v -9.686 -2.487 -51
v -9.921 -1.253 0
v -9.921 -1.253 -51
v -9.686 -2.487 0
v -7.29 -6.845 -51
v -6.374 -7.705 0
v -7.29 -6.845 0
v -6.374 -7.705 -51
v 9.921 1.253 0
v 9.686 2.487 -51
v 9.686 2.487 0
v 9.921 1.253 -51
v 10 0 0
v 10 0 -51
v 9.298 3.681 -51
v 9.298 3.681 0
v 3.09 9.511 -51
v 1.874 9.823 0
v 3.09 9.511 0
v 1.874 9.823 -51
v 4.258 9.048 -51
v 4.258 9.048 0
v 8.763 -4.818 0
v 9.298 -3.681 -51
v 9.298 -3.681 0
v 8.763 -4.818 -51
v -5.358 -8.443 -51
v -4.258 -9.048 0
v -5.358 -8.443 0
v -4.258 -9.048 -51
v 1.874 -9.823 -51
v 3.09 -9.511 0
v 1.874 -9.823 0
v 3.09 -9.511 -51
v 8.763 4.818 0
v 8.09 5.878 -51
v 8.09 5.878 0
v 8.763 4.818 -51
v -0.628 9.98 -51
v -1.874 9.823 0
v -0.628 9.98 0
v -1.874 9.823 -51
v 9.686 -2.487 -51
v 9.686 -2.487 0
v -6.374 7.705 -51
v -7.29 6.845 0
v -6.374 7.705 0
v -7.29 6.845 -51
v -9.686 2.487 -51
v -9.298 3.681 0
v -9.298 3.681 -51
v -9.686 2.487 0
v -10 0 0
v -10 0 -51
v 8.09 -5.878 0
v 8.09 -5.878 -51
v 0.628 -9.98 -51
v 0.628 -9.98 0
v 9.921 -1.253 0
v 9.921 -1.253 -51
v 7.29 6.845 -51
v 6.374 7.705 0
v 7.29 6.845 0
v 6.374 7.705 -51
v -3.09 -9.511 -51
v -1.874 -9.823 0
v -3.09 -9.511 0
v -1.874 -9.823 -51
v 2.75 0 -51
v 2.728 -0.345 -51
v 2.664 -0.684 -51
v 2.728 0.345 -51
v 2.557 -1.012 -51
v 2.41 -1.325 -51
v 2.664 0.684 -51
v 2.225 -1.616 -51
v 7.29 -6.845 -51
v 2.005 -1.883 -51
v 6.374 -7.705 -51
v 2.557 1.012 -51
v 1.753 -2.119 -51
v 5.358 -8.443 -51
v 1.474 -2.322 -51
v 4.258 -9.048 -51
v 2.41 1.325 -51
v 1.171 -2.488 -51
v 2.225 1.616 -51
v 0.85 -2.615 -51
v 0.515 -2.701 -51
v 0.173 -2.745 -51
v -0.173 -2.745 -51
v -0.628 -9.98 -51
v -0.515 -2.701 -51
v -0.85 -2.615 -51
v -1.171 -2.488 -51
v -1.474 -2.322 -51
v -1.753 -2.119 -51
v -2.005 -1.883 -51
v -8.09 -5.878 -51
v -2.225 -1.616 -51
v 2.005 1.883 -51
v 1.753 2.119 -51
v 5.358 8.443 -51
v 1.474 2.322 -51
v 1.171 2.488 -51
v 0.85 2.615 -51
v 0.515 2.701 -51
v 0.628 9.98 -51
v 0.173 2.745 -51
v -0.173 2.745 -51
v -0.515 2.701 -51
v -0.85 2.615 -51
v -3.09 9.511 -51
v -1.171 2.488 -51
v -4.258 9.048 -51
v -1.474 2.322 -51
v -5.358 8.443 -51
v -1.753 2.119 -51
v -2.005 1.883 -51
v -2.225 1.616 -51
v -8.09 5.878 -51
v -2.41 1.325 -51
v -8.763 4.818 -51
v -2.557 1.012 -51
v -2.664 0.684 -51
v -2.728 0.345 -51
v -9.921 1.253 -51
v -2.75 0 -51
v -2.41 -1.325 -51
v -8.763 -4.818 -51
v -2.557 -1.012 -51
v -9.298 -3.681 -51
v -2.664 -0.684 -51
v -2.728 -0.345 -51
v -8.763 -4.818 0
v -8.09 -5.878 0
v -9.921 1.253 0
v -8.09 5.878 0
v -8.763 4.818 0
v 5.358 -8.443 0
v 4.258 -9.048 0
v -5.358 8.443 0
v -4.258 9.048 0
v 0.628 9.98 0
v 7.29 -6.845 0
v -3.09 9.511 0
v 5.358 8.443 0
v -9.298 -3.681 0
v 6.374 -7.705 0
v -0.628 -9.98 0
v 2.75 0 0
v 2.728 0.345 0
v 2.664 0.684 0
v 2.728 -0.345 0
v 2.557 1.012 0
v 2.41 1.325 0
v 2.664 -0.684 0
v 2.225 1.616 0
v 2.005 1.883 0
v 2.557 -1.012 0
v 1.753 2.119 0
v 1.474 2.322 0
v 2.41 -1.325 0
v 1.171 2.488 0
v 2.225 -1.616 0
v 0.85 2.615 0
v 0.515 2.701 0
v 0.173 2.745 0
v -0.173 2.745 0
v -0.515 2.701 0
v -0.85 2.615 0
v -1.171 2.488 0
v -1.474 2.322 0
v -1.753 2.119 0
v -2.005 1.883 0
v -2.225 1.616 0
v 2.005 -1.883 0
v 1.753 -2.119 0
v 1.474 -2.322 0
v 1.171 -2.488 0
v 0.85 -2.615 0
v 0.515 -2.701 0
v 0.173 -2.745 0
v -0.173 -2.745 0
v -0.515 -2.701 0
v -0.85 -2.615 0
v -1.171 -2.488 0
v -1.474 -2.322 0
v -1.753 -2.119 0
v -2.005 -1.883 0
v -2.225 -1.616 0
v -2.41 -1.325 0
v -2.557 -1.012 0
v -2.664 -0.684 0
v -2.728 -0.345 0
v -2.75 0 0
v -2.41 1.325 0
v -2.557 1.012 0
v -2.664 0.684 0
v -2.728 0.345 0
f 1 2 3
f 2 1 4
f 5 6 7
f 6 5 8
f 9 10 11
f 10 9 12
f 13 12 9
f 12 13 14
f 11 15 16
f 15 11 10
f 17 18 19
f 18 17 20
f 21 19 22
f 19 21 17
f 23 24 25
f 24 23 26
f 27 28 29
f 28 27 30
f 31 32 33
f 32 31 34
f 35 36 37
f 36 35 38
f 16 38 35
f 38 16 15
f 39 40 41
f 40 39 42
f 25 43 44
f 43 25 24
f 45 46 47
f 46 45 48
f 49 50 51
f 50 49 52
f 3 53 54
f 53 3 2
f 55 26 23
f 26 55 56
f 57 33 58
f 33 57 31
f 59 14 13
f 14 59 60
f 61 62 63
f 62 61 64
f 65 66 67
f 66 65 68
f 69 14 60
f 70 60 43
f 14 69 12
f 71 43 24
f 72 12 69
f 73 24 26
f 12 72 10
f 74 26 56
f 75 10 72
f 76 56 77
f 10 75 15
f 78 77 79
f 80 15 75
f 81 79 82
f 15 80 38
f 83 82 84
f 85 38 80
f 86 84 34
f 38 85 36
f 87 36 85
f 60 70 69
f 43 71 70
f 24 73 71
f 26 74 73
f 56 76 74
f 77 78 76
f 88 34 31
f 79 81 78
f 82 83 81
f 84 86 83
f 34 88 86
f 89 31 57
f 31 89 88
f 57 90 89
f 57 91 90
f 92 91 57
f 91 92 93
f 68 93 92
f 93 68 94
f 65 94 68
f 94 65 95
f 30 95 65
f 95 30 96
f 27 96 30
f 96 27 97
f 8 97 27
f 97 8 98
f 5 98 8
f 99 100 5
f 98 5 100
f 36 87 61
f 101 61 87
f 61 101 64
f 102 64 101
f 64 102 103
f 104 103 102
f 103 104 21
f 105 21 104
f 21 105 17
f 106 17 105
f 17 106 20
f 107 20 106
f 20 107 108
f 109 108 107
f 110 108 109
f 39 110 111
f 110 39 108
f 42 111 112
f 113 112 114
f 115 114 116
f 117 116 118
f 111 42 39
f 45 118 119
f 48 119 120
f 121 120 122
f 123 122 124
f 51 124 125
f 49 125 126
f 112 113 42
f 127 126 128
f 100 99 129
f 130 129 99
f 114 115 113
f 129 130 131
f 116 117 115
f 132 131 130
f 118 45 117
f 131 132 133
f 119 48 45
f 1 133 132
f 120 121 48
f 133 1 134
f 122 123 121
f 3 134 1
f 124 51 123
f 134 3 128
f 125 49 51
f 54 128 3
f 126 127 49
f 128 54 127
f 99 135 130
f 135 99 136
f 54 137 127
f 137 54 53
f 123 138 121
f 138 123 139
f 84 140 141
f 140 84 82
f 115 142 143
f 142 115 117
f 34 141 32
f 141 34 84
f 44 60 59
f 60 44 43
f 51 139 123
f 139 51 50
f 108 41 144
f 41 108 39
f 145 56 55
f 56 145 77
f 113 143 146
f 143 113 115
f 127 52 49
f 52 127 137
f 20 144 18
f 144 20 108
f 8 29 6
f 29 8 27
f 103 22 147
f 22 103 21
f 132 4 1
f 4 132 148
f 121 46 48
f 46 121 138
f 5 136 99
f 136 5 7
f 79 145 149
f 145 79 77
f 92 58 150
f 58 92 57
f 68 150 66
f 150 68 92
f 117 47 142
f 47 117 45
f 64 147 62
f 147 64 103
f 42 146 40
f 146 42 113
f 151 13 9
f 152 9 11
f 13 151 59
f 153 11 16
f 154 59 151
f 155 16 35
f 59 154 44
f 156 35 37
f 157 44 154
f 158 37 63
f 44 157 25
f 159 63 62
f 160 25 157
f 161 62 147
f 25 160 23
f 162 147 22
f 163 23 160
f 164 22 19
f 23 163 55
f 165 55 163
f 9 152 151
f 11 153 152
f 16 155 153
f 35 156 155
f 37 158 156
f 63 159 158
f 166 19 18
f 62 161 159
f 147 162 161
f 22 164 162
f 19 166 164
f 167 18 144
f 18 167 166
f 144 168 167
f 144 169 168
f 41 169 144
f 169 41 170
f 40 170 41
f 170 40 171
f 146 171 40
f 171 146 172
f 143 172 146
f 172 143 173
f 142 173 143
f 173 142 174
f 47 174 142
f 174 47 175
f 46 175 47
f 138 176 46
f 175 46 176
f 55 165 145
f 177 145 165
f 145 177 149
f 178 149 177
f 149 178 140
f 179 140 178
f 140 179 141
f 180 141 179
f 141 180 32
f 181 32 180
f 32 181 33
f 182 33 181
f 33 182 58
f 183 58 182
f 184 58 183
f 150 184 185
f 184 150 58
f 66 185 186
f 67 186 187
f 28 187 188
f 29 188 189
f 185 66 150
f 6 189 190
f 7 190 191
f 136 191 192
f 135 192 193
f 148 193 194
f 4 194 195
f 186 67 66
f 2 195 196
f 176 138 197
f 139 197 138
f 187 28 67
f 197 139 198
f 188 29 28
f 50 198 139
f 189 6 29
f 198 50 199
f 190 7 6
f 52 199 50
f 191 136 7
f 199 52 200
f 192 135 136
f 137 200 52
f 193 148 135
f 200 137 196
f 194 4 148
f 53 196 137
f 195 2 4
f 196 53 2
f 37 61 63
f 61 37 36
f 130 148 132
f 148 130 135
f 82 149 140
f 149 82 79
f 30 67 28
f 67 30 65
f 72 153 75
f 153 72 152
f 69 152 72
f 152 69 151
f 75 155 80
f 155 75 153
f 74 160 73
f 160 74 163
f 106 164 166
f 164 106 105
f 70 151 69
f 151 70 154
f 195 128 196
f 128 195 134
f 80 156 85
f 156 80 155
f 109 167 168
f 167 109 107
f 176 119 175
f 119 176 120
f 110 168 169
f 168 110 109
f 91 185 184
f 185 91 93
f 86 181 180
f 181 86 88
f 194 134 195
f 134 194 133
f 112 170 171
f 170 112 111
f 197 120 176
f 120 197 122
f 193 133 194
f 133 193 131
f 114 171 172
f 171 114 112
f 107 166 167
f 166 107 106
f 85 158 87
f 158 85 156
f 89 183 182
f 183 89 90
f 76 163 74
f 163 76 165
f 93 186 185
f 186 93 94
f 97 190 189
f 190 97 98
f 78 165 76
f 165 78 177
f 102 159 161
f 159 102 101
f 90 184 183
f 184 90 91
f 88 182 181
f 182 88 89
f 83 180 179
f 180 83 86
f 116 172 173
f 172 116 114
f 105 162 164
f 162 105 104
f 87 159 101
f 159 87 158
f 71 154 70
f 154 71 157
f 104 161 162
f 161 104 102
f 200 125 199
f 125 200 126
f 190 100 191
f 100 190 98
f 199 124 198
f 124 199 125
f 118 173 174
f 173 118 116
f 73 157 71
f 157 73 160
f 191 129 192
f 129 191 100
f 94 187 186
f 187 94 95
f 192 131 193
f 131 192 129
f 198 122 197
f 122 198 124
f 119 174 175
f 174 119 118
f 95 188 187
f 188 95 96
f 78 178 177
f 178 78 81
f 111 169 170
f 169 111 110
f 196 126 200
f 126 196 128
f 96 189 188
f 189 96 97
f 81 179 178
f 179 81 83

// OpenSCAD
$fn = 50;


difference() {
	union() {
		translate(v = [0, 0, -51.0000000000]) {
			cylinder(h = 51, r = 10.0000000000);
		}
		cylinder(h = 0, r = 20.0000000000);
	}
	union() {
		#translate(v = [0, 0, -51]) {
			cylinder(h = 51, r = 2.7500000000);
		}
	}
}
